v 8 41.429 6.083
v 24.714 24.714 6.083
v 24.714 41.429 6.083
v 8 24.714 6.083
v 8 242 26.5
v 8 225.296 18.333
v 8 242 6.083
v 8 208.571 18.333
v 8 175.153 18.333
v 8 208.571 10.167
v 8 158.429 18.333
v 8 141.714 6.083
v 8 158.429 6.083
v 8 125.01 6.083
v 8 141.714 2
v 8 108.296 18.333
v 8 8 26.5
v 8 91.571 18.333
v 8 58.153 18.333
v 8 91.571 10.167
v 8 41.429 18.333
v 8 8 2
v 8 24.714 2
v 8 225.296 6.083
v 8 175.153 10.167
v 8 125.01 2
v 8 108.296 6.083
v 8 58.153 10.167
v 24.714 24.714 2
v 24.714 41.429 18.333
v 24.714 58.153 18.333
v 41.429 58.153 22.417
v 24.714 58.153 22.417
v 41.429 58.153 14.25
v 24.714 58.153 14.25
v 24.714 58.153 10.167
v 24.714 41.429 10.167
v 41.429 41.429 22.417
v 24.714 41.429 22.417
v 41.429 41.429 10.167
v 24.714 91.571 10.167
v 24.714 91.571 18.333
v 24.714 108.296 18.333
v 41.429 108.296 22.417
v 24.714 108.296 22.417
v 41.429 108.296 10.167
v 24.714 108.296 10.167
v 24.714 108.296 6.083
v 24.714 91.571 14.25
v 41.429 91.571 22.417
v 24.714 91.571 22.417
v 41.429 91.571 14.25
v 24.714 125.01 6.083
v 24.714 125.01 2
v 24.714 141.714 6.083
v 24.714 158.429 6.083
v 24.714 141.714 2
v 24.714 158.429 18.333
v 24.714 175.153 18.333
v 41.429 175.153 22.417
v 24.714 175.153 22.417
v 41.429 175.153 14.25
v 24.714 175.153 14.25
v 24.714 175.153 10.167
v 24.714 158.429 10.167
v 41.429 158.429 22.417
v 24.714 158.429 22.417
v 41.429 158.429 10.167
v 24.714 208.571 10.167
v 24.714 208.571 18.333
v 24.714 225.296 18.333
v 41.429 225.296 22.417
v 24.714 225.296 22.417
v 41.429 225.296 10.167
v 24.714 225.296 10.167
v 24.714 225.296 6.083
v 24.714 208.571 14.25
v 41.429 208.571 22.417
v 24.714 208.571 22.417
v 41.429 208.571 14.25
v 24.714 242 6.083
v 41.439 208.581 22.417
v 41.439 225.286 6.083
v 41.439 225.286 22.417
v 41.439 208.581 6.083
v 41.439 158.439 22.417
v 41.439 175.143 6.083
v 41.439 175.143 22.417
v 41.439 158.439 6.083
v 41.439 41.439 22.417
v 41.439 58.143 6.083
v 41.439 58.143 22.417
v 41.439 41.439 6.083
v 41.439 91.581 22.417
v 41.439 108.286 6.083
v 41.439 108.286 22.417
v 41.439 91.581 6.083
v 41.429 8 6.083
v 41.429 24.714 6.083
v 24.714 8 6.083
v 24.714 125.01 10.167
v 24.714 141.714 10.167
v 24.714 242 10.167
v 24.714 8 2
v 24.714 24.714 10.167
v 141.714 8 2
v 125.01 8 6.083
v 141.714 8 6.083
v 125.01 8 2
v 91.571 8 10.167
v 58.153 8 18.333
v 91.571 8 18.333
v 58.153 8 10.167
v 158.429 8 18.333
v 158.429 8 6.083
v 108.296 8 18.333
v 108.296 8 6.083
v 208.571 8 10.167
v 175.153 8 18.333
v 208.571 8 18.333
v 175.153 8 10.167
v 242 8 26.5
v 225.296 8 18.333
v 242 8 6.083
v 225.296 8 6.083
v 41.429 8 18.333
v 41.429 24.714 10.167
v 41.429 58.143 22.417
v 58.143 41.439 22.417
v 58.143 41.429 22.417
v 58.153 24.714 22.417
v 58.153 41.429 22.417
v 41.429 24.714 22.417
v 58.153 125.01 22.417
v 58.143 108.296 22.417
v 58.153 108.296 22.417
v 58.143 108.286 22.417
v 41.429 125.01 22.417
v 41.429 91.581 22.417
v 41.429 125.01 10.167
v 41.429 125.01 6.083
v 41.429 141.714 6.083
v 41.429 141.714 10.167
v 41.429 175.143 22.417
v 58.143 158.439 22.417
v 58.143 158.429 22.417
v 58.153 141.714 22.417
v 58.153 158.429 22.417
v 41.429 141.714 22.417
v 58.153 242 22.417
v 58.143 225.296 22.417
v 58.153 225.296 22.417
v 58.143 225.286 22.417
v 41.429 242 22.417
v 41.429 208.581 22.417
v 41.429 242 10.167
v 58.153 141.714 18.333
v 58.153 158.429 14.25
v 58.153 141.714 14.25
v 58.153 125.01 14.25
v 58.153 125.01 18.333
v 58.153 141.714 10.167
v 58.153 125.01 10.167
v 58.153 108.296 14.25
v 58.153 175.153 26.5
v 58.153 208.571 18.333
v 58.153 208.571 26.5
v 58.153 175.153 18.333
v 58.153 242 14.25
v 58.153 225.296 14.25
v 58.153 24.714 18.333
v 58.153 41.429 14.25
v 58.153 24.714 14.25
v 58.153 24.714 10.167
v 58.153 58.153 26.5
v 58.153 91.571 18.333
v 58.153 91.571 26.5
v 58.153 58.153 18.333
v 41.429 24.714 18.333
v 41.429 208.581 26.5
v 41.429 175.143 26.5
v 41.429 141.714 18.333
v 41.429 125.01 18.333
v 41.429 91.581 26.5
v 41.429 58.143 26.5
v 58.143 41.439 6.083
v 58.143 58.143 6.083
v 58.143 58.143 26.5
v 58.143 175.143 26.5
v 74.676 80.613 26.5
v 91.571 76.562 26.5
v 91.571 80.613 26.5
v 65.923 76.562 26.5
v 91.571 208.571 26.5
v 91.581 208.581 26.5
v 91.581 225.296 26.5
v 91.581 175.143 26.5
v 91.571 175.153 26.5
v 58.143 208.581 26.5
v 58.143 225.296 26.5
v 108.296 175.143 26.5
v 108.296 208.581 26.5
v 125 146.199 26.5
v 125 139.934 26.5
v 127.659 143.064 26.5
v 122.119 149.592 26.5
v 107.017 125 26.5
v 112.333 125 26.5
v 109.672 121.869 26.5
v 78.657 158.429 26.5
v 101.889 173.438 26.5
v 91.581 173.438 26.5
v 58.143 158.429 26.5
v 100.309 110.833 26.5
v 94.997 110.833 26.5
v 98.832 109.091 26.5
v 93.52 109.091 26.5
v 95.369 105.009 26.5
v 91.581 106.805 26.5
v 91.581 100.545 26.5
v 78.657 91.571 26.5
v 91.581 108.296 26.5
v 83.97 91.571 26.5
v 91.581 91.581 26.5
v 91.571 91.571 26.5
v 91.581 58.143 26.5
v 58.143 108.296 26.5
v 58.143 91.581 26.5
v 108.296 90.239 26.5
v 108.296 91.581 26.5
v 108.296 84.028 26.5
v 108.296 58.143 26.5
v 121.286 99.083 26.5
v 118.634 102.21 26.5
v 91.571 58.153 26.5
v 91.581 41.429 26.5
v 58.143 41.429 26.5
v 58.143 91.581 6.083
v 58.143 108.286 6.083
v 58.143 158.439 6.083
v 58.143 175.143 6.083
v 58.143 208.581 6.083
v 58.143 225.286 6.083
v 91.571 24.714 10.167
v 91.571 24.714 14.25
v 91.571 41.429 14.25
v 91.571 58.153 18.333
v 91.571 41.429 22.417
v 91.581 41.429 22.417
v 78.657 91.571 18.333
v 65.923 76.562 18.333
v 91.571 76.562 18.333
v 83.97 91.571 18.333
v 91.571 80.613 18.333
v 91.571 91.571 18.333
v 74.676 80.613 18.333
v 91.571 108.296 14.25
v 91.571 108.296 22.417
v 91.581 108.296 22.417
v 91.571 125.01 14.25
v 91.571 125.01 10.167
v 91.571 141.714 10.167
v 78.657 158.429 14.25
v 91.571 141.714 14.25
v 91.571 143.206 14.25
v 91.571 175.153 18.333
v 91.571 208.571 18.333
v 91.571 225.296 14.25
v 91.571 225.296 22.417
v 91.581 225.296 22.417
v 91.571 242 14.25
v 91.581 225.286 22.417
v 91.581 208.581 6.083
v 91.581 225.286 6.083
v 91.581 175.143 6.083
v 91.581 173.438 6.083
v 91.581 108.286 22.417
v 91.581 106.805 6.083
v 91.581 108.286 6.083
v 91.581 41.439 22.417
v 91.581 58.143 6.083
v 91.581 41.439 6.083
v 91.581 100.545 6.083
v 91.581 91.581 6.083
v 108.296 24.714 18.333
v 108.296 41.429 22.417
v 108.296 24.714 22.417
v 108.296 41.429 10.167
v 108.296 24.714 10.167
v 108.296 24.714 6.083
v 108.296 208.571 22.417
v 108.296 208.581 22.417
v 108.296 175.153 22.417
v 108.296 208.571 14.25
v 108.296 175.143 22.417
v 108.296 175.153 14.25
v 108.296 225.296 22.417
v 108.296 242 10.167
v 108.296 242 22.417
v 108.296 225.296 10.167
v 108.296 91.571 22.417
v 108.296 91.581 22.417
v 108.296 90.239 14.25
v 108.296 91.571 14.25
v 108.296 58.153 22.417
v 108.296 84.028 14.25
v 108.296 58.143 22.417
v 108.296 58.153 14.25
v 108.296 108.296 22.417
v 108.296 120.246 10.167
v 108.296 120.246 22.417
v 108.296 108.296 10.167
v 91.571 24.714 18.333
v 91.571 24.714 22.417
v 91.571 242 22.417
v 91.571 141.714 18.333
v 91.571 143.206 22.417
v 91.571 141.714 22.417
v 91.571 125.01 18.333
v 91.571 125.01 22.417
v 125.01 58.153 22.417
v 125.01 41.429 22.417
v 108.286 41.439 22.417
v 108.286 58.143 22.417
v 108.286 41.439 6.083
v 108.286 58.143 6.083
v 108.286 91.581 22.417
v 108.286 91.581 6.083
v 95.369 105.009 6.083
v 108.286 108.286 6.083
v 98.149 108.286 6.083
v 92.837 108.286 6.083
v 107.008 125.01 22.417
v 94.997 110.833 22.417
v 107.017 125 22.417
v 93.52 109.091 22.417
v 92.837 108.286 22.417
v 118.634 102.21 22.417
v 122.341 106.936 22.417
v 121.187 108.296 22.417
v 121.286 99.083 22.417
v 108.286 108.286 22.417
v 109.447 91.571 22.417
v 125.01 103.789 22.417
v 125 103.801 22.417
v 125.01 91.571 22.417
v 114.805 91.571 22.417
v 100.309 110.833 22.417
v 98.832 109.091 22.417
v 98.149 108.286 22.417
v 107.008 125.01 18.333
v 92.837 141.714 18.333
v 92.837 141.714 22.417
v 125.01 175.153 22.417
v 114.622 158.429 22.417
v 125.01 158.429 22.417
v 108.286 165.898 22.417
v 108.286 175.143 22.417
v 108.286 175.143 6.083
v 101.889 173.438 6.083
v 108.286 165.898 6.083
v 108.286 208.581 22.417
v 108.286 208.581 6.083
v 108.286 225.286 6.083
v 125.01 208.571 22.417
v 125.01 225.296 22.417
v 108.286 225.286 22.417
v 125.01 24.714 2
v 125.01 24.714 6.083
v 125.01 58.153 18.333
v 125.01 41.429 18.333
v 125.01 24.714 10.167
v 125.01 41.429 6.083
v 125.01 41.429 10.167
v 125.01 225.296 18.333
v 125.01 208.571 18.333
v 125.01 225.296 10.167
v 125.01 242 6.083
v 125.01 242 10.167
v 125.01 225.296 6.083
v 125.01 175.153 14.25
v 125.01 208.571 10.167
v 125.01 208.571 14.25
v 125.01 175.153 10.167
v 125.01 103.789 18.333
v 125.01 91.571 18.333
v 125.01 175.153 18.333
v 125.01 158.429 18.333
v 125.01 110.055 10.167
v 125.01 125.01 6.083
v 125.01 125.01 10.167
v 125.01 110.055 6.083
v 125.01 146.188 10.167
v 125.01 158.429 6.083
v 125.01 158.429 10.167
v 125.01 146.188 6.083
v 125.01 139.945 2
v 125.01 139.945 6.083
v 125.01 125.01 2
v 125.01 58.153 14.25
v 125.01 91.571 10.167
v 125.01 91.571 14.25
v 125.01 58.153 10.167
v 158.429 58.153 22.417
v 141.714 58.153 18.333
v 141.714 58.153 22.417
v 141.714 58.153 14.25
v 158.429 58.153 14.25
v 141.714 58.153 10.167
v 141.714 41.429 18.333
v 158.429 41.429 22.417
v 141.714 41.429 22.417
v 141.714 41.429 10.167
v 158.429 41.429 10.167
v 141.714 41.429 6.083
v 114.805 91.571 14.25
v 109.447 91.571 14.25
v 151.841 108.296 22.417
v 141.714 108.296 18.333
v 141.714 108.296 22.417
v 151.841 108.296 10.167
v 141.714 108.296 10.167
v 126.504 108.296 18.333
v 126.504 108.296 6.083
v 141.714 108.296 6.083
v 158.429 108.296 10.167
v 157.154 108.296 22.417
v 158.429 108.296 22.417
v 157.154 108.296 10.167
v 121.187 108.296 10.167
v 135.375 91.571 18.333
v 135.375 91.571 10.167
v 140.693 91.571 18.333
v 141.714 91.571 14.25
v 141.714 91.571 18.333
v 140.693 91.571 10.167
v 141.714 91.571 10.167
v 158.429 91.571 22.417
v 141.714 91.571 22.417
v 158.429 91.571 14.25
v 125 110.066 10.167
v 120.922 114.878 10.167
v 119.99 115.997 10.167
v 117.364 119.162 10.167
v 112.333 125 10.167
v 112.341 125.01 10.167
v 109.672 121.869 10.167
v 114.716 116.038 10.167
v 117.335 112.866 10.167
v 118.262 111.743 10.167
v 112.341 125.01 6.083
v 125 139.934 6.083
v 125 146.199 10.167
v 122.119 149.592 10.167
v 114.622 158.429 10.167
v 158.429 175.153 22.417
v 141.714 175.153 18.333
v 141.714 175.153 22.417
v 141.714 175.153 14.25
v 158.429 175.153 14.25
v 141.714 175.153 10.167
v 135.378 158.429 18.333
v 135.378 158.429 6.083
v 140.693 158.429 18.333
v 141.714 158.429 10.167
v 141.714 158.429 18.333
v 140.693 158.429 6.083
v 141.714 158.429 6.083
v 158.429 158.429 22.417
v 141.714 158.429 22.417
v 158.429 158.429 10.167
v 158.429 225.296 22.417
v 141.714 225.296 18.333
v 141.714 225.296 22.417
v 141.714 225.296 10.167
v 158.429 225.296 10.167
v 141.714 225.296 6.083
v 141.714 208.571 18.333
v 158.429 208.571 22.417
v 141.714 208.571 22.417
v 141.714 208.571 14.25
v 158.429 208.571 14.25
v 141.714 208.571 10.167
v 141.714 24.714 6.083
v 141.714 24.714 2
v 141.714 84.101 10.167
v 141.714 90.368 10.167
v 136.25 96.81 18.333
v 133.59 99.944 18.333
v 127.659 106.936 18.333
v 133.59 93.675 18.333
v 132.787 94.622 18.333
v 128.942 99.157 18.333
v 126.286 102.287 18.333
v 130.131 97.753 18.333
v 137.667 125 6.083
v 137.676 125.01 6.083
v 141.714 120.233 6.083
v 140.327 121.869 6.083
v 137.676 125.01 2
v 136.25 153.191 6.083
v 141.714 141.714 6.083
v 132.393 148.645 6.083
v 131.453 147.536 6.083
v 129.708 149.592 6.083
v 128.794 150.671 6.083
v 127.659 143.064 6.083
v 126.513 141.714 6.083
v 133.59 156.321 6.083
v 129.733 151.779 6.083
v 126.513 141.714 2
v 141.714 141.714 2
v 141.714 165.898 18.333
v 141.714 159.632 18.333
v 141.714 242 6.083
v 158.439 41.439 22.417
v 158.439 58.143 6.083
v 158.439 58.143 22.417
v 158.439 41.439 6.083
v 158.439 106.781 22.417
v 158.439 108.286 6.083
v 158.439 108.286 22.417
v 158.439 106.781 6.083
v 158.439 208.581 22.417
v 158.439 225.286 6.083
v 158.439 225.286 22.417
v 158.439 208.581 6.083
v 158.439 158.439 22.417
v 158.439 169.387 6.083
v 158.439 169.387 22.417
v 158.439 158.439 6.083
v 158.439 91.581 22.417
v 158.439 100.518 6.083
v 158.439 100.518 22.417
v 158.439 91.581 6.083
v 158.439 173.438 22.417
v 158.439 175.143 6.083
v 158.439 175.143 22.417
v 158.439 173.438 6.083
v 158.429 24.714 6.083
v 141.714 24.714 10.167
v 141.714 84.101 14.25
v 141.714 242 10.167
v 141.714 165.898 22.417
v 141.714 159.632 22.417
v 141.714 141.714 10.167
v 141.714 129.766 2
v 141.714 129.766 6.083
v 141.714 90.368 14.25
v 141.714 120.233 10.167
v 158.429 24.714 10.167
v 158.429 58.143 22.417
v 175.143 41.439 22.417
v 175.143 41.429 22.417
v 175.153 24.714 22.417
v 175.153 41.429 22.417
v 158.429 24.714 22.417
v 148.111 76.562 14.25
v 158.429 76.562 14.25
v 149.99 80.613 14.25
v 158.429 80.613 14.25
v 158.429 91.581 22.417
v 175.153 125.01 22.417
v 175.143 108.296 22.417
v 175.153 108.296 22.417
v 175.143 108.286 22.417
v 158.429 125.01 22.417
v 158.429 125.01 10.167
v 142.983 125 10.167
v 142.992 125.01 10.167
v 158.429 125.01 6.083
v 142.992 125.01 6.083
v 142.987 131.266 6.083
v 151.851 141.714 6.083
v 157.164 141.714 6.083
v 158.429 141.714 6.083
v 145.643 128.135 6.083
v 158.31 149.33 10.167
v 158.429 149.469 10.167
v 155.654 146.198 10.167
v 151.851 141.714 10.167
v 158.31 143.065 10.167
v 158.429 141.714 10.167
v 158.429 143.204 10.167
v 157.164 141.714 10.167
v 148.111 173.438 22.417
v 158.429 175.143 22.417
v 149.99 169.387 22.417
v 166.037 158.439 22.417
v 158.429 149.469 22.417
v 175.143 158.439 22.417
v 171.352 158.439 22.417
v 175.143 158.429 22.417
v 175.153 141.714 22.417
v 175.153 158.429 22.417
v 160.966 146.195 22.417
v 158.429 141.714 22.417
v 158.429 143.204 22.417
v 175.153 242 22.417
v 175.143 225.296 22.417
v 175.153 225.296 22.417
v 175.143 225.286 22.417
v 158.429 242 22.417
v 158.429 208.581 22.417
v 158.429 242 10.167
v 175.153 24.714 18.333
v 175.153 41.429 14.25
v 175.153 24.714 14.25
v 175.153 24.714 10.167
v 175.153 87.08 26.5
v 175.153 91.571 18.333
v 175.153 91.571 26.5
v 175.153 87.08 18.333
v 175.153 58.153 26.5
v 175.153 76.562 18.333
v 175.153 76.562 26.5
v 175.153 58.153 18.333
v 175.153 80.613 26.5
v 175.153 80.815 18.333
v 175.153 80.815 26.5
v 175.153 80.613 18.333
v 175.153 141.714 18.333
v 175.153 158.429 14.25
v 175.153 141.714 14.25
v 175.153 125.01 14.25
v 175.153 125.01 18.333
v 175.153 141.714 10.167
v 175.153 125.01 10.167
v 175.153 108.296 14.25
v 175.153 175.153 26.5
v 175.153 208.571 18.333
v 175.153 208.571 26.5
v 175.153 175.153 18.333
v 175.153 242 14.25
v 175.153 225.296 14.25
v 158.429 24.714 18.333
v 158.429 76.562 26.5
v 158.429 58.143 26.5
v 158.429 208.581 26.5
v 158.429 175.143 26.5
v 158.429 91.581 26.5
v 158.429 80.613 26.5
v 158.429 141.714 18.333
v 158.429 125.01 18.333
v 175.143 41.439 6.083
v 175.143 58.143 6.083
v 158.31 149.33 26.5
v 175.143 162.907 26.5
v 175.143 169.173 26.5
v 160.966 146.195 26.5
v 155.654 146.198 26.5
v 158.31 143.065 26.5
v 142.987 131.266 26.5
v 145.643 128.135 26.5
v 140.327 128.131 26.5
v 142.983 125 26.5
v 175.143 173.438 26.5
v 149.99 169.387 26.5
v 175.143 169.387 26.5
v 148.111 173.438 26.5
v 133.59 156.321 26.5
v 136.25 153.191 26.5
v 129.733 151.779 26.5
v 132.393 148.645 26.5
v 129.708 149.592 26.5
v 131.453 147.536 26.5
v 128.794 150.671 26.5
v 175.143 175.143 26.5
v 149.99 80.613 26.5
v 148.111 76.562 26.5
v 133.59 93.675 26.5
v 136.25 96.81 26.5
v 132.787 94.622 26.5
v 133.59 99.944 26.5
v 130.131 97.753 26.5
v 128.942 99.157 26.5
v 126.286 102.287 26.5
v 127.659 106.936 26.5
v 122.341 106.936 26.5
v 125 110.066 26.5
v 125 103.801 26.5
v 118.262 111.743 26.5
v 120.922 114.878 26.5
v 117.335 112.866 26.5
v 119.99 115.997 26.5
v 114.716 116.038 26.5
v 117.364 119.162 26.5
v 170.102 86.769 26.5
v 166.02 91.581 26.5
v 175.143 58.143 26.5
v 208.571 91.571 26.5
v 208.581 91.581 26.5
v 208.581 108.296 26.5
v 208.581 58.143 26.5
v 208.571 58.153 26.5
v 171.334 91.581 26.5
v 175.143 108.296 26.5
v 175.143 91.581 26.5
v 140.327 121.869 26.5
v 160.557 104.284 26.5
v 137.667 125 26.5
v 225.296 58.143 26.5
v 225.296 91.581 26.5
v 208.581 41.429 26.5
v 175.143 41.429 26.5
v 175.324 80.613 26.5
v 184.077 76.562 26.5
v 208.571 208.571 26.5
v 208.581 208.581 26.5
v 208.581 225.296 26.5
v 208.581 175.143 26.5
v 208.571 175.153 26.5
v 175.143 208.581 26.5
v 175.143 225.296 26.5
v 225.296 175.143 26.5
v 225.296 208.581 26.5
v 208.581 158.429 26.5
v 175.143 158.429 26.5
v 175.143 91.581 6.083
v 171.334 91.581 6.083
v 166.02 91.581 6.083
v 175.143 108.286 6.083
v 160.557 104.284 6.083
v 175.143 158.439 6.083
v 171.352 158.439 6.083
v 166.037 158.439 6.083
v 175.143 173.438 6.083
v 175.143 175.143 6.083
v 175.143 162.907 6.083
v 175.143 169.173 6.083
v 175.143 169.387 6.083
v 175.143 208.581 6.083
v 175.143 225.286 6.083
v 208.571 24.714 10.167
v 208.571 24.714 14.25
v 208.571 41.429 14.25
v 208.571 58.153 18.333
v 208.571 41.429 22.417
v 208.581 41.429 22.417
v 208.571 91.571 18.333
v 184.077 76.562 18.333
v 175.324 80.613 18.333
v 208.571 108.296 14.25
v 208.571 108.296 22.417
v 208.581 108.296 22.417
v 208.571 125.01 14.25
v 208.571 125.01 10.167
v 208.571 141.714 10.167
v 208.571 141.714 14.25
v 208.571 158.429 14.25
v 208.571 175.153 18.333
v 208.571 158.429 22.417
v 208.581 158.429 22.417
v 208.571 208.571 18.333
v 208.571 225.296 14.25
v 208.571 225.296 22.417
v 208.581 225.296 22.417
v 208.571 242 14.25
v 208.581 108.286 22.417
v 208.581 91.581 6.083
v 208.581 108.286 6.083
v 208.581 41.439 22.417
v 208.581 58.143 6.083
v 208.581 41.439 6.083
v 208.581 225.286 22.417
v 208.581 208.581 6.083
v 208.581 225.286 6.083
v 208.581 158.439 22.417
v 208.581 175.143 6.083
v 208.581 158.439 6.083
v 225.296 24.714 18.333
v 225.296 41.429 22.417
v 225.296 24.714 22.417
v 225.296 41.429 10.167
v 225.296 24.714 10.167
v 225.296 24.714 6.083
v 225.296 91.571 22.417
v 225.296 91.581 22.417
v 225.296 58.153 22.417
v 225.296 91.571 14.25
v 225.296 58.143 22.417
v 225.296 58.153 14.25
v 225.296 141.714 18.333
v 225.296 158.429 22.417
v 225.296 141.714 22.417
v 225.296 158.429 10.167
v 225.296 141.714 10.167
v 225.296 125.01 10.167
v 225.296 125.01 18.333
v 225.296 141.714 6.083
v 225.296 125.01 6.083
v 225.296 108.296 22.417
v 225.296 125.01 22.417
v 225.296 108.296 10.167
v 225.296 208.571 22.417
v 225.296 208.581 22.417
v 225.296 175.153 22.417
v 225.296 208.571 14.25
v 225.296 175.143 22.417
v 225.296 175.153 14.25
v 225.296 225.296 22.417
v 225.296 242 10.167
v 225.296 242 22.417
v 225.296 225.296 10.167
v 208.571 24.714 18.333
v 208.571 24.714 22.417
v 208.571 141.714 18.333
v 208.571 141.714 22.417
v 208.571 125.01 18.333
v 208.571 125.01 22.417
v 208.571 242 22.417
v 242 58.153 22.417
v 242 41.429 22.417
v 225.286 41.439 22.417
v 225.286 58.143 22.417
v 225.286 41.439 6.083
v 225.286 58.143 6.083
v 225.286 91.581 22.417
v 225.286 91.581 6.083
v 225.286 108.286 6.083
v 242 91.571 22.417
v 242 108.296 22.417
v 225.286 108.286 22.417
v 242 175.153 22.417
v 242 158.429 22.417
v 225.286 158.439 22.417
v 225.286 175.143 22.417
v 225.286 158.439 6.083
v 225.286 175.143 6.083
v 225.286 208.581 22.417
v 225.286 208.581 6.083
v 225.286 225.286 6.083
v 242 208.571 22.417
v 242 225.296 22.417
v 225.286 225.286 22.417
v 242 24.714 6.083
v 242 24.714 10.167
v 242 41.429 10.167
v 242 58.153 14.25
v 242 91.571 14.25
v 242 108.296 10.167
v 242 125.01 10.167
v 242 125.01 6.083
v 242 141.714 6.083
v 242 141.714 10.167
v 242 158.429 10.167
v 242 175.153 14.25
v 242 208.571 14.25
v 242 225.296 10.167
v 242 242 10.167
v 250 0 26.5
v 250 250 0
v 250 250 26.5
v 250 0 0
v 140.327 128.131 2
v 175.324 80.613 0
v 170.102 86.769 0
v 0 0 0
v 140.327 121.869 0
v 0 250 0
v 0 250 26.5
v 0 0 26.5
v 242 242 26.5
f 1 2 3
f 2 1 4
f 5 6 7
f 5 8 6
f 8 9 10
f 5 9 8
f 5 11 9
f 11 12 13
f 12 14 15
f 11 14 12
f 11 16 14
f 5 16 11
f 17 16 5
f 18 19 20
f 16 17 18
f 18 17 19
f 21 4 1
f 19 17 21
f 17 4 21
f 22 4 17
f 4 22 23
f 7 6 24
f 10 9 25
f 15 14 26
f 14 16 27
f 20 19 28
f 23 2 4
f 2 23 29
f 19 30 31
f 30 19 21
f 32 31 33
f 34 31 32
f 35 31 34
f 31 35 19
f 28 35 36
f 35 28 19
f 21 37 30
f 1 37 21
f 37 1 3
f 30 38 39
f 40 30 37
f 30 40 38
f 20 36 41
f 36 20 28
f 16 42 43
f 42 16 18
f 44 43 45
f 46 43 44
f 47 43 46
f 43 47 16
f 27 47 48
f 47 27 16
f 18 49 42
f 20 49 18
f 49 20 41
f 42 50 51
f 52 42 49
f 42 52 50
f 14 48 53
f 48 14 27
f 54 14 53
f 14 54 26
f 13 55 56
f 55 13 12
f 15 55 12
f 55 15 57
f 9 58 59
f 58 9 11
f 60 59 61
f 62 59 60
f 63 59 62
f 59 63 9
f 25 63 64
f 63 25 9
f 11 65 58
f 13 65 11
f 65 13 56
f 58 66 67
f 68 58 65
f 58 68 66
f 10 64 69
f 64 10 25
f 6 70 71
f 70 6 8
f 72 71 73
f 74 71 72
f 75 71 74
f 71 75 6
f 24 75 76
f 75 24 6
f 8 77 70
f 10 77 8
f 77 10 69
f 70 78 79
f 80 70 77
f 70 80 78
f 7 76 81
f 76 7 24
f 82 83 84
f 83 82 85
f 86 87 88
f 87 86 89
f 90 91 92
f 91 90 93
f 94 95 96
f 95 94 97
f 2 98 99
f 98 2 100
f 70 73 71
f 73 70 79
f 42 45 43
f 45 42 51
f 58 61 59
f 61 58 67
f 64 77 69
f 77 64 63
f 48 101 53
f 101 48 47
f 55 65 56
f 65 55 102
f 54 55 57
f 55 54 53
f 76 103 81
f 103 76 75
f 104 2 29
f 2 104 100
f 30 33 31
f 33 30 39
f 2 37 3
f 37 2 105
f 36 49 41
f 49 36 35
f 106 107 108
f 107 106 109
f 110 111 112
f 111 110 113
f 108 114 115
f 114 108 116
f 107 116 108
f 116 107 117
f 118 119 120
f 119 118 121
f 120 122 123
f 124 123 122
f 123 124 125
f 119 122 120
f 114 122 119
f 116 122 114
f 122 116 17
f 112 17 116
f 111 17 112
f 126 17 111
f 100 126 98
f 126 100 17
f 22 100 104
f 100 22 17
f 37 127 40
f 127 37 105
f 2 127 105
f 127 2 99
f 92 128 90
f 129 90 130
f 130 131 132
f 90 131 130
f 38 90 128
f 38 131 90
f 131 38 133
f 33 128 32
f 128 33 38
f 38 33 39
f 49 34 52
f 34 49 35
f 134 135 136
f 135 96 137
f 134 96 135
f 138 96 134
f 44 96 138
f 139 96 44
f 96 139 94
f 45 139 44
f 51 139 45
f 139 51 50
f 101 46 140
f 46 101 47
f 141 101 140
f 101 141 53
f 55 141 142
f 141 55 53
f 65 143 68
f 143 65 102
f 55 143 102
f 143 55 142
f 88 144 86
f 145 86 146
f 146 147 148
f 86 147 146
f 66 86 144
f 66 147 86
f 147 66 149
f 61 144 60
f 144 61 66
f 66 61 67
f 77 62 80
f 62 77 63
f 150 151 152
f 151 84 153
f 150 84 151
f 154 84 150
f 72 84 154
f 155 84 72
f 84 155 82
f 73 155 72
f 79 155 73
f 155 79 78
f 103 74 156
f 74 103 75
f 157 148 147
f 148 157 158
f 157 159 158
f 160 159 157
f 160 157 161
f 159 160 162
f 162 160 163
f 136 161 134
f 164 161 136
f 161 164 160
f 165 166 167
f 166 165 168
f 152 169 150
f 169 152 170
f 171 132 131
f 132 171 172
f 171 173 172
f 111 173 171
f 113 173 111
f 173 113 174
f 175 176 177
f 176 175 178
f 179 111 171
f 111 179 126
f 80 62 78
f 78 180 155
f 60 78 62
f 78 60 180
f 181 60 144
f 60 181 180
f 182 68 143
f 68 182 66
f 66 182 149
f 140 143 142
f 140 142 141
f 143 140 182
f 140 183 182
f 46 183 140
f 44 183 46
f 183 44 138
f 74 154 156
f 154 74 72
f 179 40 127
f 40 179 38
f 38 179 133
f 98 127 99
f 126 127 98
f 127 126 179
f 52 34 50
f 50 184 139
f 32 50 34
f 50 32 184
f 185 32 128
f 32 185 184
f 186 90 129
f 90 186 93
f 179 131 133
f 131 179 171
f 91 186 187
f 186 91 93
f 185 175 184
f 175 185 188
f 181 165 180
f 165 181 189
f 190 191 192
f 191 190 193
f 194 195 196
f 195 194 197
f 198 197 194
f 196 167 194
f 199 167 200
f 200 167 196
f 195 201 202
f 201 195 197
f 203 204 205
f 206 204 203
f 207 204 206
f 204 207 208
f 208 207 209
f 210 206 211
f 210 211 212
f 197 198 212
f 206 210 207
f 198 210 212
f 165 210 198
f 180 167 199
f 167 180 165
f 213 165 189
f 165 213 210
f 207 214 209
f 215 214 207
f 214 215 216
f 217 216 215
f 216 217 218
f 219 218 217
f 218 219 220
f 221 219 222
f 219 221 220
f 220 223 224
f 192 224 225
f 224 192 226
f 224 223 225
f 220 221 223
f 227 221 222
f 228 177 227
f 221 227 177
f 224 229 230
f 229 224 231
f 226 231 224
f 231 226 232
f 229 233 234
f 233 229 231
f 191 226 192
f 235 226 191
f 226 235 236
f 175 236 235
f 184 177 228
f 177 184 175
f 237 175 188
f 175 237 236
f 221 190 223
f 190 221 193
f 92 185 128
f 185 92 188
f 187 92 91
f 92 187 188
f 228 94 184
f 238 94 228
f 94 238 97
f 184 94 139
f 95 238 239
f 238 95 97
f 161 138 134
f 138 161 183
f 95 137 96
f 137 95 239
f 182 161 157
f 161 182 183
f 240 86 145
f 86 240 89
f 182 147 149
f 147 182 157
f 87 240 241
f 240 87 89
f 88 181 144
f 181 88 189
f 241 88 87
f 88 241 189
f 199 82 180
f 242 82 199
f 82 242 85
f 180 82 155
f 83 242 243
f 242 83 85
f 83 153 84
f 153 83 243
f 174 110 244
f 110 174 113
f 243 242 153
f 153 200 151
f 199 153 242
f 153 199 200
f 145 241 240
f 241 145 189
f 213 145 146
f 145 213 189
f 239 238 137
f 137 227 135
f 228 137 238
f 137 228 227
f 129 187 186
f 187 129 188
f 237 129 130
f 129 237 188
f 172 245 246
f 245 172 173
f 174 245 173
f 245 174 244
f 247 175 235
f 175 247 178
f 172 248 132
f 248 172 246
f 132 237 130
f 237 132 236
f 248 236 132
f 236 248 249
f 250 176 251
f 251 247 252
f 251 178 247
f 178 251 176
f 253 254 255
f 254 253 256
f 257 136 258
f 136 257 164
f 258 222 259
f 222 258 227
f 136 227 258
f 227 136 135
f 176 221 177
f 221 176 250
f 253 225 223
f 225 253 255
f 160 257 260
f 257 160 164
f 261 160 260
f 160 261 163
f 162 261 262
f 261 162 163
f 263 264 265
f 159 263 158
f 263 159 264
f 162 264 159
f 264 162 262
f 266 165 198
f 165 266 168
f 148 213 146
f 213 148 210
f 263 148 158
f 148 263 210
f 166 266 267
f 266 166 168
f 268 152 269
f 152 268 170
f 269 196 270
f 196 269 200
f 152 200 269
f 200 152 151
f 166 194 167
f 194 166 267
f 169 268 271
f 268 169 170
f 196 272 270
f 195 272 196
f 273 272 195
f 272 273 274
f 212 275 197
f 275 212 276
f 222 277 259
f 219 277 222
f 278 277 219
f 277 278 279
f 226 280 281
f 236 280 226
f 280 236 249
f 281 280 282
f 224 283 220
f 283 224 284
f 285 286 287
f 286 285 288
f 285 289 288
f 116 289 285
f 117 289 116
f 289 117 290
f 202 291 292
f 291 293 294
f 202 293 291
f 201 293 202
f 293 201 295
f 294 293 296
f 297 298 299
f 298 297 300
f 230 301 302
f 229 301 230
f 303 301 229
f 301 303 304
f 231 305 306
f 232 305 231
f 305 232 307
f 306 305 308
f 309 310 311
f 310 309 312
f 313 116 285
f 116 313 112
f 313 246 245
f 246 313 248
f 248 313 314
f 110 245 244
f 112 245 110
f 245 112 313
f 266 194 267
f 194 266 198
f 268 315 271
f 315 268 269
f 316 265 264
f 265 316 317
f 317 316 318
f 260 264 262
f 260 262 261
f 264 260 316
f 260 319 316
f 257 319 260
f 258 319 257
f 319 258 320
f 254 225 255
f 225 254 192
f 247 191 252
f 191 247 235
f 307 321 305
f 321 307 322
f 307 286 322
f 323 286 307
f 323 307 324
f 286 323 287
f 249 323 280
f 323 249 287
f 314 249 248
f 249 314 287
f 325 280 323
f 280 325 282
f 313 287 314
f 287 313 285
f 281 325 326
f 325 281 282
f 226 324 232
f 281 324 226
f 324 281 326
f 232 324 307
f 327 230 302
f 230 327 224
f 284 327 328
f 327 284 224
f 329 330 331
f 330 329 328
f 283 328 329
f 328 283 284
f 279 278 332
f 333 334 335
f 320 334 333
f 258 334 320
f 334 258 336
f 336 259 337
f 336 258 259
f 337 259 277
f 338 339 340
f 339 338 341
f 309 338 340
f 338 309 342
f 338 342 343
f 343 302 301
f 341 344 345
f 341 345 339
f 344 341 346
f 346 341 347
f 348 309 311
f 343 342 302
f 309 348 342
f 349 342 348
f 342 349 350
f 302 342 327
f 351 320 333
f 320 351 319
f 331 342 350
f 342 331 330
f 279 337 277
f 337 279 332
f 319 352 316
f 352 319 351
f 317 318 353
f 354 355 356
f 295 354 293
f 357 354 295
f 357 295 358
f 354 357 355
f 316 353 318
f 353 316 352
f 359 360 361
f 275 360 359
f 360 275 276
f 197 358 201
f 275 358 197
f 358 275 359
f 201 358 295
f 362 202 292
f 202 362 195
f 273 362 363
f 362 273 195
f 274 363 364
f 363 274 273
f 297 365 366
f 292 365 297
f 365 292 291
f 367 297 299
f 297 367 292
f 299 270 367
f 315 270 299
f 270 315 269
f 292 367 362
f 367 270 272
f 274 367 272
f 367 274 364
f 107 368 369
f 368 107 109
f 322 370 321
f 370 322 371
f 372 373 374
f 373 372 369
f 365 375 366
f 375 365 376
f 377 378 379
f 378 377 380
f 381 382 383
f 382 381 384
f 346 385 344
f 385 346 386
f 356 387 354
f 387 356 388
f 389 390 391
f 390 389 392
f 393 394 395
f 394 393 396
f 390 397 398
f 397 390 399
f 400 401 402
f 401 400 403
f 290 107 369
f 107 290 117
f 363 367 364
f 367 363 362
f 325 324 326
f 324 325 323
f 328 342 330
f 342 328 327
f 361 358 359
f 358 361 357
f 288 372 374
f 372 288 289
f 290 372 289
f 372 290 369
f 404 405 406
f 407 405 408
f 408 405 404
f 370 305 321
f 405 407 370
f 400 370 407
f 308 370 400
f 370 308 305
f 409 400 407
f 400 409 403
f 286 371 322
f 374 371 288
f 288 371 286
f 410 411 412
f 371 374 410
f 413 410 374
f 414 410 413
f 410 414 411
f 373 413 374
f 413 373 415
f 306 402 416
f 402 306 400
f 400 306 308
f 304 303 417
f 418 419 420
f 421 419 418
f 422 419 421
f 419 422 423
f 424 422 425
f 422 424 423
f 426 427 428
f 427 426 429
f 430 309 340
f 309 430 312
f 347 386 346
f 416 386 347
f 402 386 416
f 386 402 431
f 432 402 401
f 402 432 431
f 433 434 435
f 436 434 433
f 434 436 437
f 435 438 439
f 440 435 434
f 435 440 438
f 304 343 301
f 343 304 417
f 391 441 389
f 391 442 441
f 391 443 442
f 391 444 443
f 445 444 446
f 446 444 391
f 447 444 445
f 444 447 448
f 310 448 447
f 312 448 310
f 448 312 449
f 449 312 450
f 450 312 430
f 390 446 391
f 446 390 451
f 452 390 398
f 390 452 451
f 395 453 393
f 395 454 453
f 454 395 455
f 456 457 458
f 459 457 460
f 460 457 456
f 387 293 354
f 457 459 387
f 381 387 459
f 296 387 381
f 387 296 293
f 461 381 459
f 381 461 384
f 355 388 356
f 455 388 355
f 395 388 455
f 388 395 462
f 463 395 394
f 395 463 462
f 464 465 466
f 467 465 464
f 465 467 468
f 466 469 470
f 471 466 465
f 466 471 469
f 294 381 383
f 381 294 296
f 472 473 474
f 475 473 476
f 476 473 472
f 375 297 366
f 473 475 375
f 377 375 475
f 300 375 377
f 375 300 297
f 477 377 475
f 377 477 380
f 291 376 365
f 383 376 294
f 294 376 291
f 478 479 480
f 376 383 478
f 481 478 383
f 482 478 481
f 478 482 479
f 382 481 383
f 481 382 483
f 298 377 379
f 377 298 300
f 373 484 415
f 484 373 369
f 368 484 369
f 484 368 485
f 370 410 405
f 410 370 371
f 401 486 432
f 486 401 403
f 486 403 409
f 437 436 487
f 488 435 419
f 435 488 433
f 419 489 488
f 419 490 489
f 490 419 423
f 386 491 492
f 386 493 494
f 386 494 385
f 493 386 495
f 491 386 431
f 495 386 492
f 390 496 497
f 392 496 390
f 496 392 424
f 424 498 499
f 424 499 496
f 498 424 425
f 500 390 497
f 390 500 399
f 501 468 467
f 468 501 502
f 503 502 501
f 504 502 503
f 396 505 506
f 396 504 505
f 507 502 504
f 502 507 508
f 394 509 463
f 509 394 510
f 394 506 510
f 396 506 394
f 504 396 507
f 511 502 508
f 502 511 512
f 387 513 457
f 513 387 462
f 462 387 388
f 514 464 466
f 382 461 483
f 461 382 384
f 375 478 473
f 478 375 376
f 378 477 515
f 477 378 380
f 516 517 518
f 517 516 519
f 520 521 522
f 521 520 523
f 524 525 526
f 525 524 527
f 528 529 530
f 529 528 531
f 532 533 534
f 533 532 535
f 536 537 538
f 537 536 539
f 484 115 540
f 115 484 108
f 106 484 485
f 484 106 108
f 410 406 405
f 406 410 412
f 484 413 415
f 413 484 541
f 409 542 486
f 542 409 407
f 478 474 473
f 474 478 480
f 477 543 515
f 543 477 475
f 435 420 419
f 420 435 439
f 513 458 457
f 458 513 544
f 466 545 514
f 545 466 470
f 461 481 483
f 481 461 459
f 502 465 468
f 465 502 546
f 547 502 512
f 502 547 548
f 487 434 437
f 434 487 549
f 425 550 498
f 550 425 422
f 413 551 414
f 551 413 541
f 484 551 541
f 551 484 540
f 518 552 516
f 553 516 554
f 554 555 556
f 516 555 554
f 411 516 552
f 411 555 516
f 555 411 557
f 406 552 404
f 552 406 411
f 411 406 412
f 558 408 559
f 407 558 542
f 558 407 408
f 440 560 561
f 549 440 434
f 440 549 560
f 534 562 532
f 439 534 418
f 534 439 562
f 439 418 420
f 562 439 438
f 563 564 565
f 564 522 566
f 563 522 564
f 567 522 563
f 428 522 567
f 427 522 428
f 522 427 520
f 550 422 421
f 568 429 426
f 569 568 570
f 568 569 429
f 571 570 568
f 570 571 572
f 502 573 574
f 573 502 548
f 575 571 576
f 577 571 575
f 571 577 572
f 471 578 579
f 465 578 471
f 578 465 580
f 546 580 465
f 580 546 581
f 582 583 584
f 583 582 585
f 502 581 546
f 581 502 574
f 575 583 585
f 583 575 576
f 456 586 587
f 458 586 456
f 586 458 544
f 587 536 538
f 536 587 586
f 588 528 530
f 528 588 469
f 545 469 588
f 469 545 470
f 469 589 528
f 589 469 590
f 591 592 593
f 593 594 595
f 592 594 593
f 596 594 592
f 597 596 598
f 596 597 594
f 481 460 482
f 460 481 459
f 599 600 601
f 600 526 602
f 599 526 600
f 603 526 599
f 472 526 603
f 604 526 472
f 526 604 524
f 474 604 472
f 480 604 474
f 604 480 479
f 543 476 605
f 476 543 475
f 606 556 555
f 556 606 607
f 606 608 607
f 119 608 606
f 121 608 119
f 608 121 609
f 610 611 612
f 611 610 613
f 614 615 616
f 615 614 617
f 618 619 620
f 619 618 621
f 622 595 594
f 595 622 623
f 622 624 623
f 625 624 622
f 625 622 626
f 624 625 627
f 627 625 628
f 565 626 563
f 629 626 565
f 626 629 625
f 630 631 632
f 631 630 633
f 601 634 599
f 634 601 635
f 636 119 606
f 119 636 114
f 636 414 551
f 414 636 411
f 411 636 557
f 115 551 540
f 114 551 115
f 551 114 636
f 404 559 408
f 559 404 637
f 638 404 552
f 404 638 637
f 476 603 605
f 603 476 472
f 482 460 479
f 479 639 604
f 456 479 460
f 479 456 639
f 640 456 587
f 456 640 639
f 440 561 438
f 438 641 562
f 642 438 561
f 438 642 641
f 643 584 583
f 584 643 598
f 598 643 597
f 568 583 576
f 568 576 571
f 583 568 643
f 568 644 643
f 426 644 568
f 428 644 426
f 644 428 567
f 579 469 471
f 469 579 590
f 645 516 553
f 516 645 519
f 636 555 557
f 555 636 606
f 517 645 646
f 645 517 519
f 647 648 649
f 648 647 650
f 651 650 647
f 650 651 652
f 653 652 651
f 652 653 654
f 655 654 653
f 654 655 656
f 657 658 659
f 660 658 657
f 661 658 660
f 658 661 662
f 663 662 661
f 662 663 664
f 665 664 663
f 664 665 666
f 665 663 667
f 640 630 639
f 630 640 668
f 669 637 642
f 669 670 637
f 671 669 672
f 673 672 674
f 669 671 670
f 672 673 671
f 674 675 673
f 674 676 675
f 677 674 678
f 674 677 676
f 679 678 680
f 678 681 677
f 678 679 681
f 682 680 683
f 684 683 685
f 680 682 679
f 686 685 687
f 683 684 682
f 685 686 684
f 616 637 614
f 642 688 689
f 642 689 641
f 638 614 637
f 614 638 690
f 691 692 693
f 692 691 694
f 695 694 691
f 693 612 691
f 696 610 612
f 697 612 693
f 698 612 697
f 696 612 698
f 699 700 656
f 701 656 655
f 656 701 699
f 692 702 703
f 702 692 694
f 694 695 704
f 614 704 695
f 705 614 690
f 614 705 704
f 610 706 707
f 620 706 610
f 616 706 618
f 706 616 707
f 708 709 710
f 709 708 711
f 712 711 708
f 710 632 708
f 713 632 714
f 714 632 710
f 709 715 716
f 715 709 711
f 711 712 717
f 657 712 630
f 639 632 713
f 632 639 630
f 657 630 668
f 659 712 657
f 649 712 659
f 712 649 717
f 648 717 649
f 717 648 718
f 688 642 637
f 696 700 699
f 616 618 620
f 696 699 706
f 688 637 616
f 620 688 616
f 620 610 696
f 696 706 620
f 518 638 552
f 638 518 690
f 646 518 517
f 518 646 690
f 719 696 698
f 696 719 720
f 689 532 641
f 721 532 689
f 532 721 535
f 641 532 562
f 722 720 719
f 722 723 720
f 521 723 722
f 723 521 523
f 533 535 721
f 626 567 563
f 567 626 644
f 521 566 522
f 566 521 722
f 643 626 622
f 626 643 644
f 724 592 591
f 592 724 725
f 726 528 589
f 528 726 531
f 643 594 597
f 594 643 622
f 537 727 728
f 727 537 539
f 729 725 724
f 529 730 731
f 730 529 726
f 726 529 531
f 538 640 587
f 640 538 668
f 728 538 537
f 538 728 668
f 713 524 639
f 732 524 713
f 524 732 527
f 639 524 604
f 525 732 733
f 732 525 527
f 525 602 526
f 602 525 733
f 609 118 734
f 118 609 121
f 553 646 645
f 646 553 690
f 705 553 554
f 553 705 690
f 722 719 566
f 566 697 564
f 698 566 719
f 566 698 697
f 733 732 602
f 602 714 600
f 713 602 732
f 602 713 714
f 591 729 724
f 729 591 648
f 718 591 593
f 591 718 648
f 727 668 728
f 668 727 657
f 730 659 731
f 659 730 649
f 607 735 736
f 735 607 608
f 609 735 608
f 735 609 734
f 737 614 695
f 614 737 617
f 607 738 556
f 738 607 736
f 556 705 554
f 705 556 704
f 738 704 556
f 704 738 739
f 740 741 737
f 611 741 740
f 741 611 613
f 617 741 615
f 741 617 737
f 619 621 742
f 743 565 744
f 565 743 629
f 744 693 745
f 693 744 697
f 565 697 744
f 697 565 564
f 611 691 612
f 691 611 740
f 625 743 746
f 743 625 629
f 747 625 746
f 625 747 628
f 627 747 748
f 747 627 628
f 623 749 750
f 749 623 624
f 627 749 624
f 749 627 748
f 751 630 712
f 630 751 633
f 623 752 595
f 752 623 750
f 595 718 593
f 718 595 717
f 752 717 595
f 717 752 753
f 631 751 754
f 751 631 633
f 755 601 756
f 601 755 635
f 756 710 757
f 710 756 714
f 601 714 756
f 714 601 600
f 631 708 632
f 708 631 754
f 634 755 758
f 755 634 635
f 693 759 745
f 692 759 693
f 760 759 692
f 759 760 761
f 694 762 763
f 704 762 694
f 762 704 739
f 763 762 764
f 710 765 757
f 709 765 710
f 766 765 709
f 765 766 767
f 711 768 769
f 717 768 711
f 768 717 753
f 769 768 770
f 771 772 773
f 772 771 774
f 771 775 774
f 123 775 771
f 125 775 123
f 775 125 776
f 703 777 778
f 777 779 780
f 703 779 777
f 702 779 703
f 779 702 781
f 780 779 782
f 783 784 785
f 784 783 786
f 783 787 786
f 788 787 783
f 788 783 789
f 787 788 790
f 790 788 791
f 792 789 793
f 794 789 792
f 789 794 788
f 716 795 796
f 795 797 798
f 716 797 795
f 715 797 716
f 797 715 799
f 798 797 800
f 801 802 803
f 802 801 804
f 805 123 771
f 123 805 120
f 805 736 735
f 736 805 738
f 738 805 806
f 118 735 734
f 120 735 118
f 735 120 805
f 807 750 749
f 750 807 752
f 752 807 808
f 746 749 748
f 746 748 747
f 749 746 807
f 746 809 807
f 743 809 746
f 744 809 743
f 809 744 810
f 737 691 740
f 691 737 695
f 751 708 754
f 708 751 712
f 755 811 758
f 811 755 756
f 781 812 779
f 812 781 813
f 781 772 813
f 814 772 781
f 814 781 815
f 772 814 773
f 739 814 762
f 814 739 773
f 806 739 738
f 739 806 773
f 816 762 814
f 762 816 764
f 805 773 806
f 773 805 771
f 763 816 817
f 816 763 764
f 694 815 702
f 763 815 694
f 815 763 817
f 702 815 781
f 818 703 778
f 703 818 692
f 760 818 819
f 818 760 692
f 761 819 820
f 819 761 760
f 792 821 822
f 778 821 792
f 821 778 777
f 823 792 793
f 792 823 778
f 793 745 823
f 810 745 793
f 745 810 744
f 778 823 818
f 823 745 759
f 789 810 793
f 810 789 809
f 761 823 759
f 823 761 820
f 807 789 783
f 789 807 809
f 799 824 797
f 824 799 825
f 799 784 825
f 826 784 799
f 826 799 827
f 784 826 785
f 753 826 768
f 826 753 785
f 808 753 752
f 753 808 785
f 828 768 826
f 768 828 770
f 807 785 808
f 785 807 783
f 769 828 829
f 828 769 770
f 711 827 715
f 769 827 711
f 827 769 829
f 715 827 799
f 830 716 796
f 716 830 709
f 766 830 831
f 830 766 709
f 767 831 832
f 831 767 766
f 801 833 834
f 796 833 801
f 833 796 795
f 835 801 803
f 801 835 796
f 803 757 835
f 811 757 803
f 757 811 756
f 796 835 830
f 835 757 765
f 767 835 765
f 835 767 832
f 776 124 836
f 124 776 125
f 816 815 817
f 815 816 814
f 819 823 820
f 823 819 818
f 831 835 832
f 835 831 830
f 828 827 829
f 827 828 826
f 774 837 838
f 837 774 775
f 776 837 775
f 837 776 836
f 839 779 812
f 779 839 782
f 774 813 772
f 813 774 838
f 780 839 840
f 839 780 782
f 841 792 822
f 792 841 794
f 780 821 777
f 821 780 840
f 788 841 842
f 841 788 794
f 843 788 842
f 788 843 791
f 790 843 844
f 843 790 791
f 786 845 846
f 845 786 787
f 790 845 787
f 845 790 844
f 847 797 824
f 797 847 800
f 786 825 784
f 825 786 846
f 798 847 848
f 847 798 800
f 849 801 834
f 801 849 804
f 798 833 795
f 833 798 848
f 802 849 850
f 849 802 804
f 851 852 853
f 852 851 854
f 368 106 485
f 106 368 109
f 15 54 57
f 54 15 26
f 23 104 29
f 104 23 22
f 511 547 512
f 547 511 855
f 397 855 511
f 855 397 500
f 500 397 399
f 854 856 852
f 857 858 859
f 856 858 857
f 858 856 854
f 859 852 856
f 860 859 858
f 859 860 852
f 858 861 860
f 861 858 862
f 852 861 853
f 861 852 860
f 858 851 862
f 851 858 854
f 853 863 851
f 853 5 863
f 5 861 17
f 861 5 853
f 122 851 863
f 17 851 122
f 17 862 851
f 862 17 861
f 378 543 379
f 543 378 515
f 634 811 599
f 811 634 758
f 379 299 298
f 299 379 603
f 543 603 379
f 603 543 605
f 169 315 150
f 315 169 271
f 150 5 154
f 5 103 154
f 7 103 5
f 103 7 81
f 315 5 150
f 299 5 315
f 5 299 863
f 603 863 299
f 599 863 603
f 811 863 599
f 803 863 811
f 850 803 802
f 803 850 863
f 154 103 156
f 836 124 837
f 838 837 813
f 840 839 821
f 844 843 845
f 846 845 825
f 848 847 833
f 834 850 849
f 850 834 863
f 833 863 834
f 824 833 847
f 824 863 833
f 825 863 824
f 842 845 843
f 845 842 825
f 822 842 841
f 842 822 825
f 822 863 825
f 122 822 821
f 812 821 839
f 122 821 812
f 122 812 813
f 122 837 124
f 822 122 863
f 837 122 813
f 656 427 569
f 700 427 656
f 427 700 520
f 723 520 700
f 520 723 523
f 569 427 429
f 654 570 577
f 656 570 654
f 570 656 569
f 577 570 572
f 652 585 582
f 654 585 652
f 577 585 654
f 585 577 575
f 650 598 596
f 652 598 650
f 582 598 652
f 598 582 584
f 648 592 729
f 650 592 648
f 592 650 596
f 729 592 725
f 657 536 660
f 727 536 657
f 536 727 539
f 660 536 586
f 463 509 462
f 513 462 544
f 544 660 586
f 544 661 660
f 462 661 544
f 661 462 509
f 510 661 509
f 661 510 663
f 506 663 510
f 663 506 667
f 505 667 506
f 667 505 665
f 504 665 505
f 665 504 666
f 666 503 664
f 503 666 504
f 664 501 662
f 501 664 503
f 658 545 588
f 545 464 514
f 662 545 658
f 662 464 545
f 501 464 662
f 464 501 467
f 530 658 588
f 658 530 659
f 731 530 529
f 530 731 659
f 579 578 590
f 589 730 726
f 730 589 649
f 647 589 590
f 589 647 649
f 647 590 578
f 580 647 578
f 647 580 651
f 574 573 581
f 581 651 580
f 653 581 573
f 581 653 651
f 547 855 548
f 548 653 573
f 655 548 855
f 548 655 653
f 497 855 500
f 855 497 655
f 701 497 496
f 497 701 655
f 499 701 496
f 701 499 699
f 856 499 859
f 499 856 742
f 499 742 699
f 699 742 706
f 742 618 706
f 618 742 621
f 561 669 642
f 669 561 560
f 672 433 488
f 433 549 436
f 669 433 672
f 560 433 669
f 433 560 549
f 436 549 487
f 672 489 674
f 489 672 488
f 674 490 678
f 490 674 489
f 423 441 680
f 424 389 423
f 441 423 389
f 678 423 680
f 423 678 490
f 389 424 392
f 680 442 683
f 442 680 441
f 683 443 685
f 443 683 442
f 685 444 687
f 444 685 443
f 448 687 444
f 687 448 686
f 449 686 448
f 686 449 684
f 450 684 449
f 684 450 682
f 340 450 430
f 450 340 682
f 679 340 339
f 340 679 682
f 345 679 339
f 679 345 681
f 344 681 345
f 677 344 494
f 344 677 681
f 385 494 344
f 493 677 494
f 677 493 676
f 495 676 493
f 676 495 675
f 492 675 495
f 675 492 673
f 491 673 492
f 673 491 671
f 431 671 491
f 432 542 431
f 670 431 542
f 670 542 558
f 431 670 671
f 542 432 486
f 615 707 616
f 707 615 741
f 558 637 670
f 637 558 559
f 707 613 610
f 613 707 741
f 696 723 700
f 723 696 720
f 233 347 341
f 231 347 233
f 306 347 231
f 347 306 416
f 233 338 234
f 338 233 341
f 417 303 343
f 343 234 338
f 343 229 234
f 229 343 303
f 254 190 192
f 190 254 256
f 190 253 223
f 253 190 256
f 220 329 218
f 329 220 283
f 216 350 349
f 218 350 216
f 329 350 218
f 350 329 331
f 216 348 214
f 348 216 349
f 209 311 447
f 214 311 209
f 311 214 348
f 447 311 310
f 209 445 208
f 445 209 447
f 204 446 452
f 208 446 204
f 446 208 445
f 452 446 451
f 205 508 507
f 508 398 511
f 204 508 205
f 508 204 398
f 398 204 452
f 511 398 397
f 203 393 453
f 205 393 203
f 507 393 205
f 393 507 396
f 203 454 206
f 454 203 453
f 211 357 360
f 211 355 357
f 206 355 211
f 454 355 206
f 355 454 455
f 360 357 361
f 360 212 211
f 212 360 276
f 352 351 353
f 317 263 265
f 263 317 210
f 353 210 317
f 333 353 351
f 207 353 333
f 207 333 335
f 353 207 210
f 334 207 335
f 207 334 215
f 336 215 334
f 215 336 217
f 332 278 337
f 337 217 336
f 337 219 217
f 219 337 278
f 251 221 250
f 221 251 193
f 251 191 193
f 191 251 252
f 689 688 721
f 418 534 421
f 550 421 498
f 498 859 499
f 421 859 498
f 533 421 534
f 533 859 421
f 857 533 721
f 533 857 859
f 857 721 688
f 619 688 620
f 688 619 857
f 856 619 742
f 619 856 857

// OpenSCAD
// file: makerx_brand.scad
// =============================================================================
// makerx_brand.scad  —  Shared brand + acoustic library for MakerX tiles
// -----------------------------------------------------------------------------
// Included with include<makerx_brand.scad> by all three variant files
// (qrd / skyline / absorber). It contains ONLY parameters, functions and
// modules — NO top-level geometry — so including it is side-effect-free.
//
// BRAND SOURCE  (captured from https://makerx.com.au/ CSS + logomark SVG):
//   --color-mx-black         #0e0f10
//   --color-mx-electic-blue  #16acf2   (electric blue)
//   --color-mx-magenta       #cc3a9d
//   --color-mx-gold          #ffc023
//   signature hero gradient  electric-blue -> magenta -> gold
//   X logomark               two mirrored chevron polygons (SVG viewBox
//                            0 0 1300 1100, Y-flipped into OpenSCAD Y-up space)
//
// TERMINOLOGY -> code:
//   "brand colours"     -> MX_BLACK / MX_BLUE / MX_MAGENTA / MX_GOLD
//   "the X / logo"      -> mx_x_2d(), mx_x_placed_2d(), mx_logo_w
//   "gradient zones"    -> mx_zone_name(), mx_color_region_2d()
//   "the frame / rim"   -> frame_w, mx_frame_2d()
//   "diffusion band"    -> f_low, f_high, N, depth_unit, max_depth, max_feat_w
// =============================================================================

// ---- Brand palette (web hex; affects preview + 3MF/AMF colour only) ----------
MX_BLACK   = "#0e0f10";
MX_BLUE    = "#16acf2";   // electric blue
MX_MAGENTA = "#cc3a9d";
MX_GOLD    = "#ffc023";

// ---- Printer / derived constants --------------------------------------------
nozzle_diameter = 0.4;
layer_height    = 0.2;
ew              = nozzle_diameter * 1.125;   // extrusion width = 0.45 mm
fudge           = 0.01;                       // boolean overlap
ef_chamfer      = 0.4;                        // elephant-foot compensation
$fn            = $preview ? 24 : 48;

// ---- Tile geometry (shared defaults; a variant file may override) -----------
tile      = 250;                 // module footprint X & Y (tiles butt together)
frame_w   = 8;                   // perimeter frame / rim width (black border)
interior  = tile - 2*frame_w;    // acoustic field side length

// ---- Acoustic band targets --------------------------------------------------
c_air   = 343000;                // speed of sound in air (mm/s)
f_low   = 4000;                  // low edge of diffusion band  -> max well depth
f_high  = 10000;                 // high edge of diffusion band -> max feature width
N       = 7;                     // Schroeder prime (quadratic-residue diffuser)
periods = 2;                     // QR periods across the tile -> N*periods cells

// quadratic-residue sequence  s_n = n^2 mod N   (n = 0..N-1)
function qr_seq(n) = (n*n) % N;
function qr_max()  = max([for (n=[0:N-1]) qr_seq(n)]);   // = 4 for N=7

lambda_low  = c_air / f_low;             // 85.75 mm  (wavelength at f_low)
depth_unit  = lambda_low / (2*N);        // 6.125 mm  (QRD depth quantum)
max_depth   = qr_max() * depth_unit;     // 24.5 mm   (deepest well / tallest cell)
max_feat_w  = c_air / (2*f_high);        // 17.15 mm  (cell width must be <= this)

fin_t       = 4*ew;                      // QRD divider / structural wall = 4 perimeters (1.8mm)

// ---- X logomark polygons (Y-flipped from site SVG, viewBox 1300x1100) --------
MX_VB = 1300;   // viewBox width  (used for scaling)
MX_CX = 650;    // viewBox centre x
MX_CY = 550;    // viewBox centre y (post-flip, content is symmetric about this)

MX_X_POLY_A = [
  [900.37,1074.75], [743.06,889.31], [701.27,840.11], [691.10,828.10], [701.00,816.41],
  [719.91,794.14], [730.09,806.15], [771.87,855.40], [920.72,1030.86], [1195.18,1030.86],
  [1010.86,813.57], [982.09,779.65], [844.86,617.88], [816.04,583.92], [787.23,550.00],
  [816.04,516.08], [1195.18,69.14], [920.72,69.14], [771.87,244.61], [743.06,278.56],
  [678.81,354.31], [650.00,388.22], [605.82,440.34], [595.73,452.47], [567.28,486.75],
  [538.59,452.91], [566.96,418.55], [577.01,406.38], [621.19,354.31], [650.00,320.34],
  [663.93,303.94], [692.70,270.03], [705.59,254.82], [714.25,244.61], [734.36,220.90],
  [743.06,210.65], [900.37,25.25], [1290.00,25.25], [1035.20,325.58], [844.82,550.00],
  [873.63,583.96], [1010.86,745.70], [1039.63,779.61], [1290.00,1074.75]
];
MX_X_POLY_B = [
  [10.00,1074.75], [455.18,550.00], [324.97,396.52], [308.97,377.65], [271.46,333.43],
  [228.48,282.79], [218.55,271.10], [215.35,267.31], [10.00,25.25], [399.63,25.25],
  [404.54,31.03], [410.17,37.66], [413.40,41.45], [423.30,53.14], [609.77,269.23],
  [581.04,303.11], [394.49,87.10], [384.59,75.41], [381.36,71.62], [379.28,69.14],
  [104.82,69.14], [244.12,233.39], [247.32,237.18], [257.25,248.88], [329.00,333.43],
  [366.51,377.65], [382.51,396.52], [483.95,516.08], [512.77,550.00], [650.00,711.78],
  [678.81,745.69], [650.00,779.66], [618.79,816.41], [399.63,1074.75]
];

// 2D X logomark, centred at origin, scaled to approx width `w`
module mx_x_2d(w) {
    scale(w / MX_VB) translate([-MX_CX, -MX_CY])
        union() { polygon(MX_X_POLY_A); polygon(MX_X_POLY_B); }
}

mx_logo_w = 120;   // logomark target width (mm) on the tile
module mx_x_placed_2d() {
    translate([tile/2, tile/2]) mx_x_2d(mx_logo_w);
}

// ---- Gradient zones (diagonal electric-blue -> magenta -> gold) -------------
// Matches the makerx.com.au hero: blue at TOP-LEFT -> magenta -> gold at
// BOTTOM-RIGHT (viewer looking at the +Z tile face, Y = up). The gradient
// parameter is t = (x + (tile - y)) / (2*tile) in [0,1]; blue t<1/3,
// magenta 1/3..2/3, gold >2/3.  mx_below(cc) returns the region t*2*tile <= cc.
module mx_below(cc) {
    // triangle for (x + y <= cc), reflected about y = tile/2 so it becomes
    // (x + (tile - y) <= cc) -> the brand diagonal (blue top-left).
    translate([0, tile/2]) mirror([0,1,0]) translate([0,-tile/2])
        polygon([[-tile,-tile], [cc+tile,-tile], [-tile,cc+tile]]);
}
// 2D interior region (inside the frame) and the frame ring
module mx_interior_2d() { translate([frame_w, frame_w]) square([interior, interior]); }
module mx_frame_2d()    { difference() { square([tile, tile]); mx_interior_2d(); } }

// 2D region for one colour body. The four regions PARTITION the whole tile
// (mutually exclusive, union = full square) so colour bodies never overlap/gap:
//   black            = frame ring  +  X logomark (drawn over the field)
//   blue/magenta/gold = its diagonal interior band, minus the X footprint
module mx_color_region_2d(name) {
    if (name == "black") {
        union() {
            mx_frame_2d();
            intersection() { mx_interior_2d(); mx_x_placed_2d(); }
        }
    } else {
        difference() {
            intersection() {
                mx_interior_2d();
                if (name == "blue")          mx_below(2*tile/3);
                else if (name == "magenta")  difference() { mx_below(4*tile/3); mx_below(2*tile/3); }
                else /* gold */              difference() { square([tile,tile]); mx_below(4*tile/3); }
            }
            mx_x_placed_2d();   // X belongs to the black body, carve it out here
        }
    }
}

// Mounting: these tiles have a flat back (diffusers) or an open standoff frame
// (absorber) intended for the usual acoustic-panel mounting — removable mounting
// strips (e.g. Command) or spray/construction adhesive on the back / frame edge.
// No screw bosses are modelled (a 2 mm back is too thin for a keyhole, and bosses
// would stop the tile sitting flat).
// main file
// === DESCRIPTION ===
// MakerX Skyline Acoustic Diffuser Tile (variant 2 of 3)
//   A 250x250 mm wall tile that scatters reflections in BOTH directions (a
//   2-D diffuser), not just horizontally like the QRD. It is an array of
//   square pillars whose heights follow a 2-D quadratic-residue pattern
//   h(i,j) ~ (s_i + s_j) mod 7. The varying surface height acts as a 2-D
//   phase grating: an incoming wavefront leaves with scrambled phase and the
//   energy spreads over a hemisphere instead of mirroring back. Looks like a
//   city "skyline" — architectural, and the most visually striking variant.
//   Like the QRD it DIFFUSES, it does not absorb.
//
// Physical context:
//   Same as the QRD tile: flat solid back, mounts to a wall/ceiling, tiles on
//   a 250 mm pitch, indoor room temperature, self-weight only.
//
// Design decisions:
//   - Band 4-10 kHz: cell WIDTH <= c/2f_high sets the top; the tallest pillar
//     (= max well depth) sets the bottom. Same shallow ~26 mm depth budget.
//   - 2-D scatter suits a single feature wall / ceiling cloud where the QRD's
//     1-D scatter axis would be arbitrary.
//   - Pillars are vertical square prisms rising from a solid base -> the ideal
//     FDM shape: prints BACK-DOWN, support-free, no bridges. Adjacent pillars
//     overlap by `fudge` so unions never share a coincident face.
//   - Brand: same blue->magenta->gold diagonal gradient + flush solid X
//     logomark (stands proud of the shorter pillars). 4 AMS colour bodies.
//
// Terminology -> code:
//   "the pillars / blocks"  -> field_skyline(), cell, seq2d()
//   "pillar height"         -> step, max_depth (from f_low/N in brand)
//   "the X / logo"          -> mx_x_placed_2d()  (makerx_brand.scad)
//   "gradient zones"        -> mx_color_region_2d()
//   "the frame / rim"       -> frame_w, mx_frame_2d()
//
// Common modifications:
//   Finer / coarser texture -> periods (brand): more periods = smaller cells
//   Lower bottom frequency  -> f_low (brand) down -> taller pillars
//   Bigger/smaller logo     -> mx_logo_w (brand)
//
// Overall dimensions: 250 x 250 x ~26.5 mm  (fits Bambu 256^3)
// Coordinate system: X,Y = tile face; Z = height from build plate.
//   Z=0 is the FLAT BACK (on bed / against wall); +Z faces the ROOM.
//   Model is in print orientation — preview matches the print.

// === PRINT SETTINGS ===
// Material: PETG. Layer Height: 0.2 mm. Perimeters: 3. Infill: 15% gyroid.
// Supports: None — pillars are vertical prisms, no overhang.
// Orientation: As modeled, flat back on the plate, pillars up.
// Notes: 250 mm flat base -> brim + Elephant-Foot Compensation (~0.15 mm),
//   dry PETG, 30-40% fan. Import the 4 part STLs as one object for AMS.

include <makerx_brand.scad>

// === PARAMETERS ===
base_thick = 2.0;                          // solid back plate (mm)
part       = "all";                         // "all"|"black"|"blue"|"magenta"|"gold"

// === DERIVED CONSTANTS ===
field_top = base_thick + max_depth;         // flush top plane (frame, logo, tallest pillar)
cells     = periods * N;                    // pillars per axis (14)
cell      = interior / cells;               // pillar pitch & width
step      = max_depth / (N - 1);            // height quantum (7 levels 0..6)

// 2-D quadratic-residue height index 0..N-1
function seq2d(ix, iy) = (qr_seq(ix % N) + qr_seq(iy % N)) % N;

// === ACCEPTANCE CONTRACTS ===
assert(tile <= 256, "Tile exceeds 256mm Bambu bed");
assert(cell <= max_feat_w, "Cell too wide -> loses the 10 kHz top end");
assert(cell > 4*ew, "Cell too narrow to print/scatter");
assert(step*(N-1) <= max_depth + 0.01, "Pillar stack exceeds depth budget");
echo(VARIANT="SKYLINE", cell=cell, cells=cells, step=step,
     f_high_actual=c_air/(2*cell), tallest=base_thick+step*(N-1), overall_depth=field_top);

// === MODULES ===
module field_skyline() {
    for (ix = [0 : cells-1]) for (iy = [0 : cells-1]) {
        rise = step * seq2d(ix, iy);
        if (rise > 0)
            translate([frame_w + ix*cell, frame_w + iy*cell, base_thick - fudge])
                cube([cell + fudge, cell + fudge, rise + fudge]);
    }
}

module full_skyline() {
    union() {
        cube([tile, tile, base_thick]);                   // flat back plate
        linear_extrude(field_top) mx_frame_2d();          // perimeter rim
        field_skyline();                                  // pillars
        linear_extrude(field_top)                         // flush solid X logo
            intersection() { mx_interior_2d(); mx_x_placed_2d(); }
    }
}

module body(name) {
    intersection() {
        full_skyline();
        translate([0, 0, -fudge])
            linear_extrude(field_top + 2*fudge) mx_color_region_2d(name);
    }
}

module assembly() {
    color(MX_BLACK)   body("black");
    color(MX_BLUE)    body("blue");
    color(MX_MAGENTA) body("magenta");
    color(MX_GOLD)    body("gold");
}

// === RENDER ===
if (part == "all") assembly();
else body(part);
